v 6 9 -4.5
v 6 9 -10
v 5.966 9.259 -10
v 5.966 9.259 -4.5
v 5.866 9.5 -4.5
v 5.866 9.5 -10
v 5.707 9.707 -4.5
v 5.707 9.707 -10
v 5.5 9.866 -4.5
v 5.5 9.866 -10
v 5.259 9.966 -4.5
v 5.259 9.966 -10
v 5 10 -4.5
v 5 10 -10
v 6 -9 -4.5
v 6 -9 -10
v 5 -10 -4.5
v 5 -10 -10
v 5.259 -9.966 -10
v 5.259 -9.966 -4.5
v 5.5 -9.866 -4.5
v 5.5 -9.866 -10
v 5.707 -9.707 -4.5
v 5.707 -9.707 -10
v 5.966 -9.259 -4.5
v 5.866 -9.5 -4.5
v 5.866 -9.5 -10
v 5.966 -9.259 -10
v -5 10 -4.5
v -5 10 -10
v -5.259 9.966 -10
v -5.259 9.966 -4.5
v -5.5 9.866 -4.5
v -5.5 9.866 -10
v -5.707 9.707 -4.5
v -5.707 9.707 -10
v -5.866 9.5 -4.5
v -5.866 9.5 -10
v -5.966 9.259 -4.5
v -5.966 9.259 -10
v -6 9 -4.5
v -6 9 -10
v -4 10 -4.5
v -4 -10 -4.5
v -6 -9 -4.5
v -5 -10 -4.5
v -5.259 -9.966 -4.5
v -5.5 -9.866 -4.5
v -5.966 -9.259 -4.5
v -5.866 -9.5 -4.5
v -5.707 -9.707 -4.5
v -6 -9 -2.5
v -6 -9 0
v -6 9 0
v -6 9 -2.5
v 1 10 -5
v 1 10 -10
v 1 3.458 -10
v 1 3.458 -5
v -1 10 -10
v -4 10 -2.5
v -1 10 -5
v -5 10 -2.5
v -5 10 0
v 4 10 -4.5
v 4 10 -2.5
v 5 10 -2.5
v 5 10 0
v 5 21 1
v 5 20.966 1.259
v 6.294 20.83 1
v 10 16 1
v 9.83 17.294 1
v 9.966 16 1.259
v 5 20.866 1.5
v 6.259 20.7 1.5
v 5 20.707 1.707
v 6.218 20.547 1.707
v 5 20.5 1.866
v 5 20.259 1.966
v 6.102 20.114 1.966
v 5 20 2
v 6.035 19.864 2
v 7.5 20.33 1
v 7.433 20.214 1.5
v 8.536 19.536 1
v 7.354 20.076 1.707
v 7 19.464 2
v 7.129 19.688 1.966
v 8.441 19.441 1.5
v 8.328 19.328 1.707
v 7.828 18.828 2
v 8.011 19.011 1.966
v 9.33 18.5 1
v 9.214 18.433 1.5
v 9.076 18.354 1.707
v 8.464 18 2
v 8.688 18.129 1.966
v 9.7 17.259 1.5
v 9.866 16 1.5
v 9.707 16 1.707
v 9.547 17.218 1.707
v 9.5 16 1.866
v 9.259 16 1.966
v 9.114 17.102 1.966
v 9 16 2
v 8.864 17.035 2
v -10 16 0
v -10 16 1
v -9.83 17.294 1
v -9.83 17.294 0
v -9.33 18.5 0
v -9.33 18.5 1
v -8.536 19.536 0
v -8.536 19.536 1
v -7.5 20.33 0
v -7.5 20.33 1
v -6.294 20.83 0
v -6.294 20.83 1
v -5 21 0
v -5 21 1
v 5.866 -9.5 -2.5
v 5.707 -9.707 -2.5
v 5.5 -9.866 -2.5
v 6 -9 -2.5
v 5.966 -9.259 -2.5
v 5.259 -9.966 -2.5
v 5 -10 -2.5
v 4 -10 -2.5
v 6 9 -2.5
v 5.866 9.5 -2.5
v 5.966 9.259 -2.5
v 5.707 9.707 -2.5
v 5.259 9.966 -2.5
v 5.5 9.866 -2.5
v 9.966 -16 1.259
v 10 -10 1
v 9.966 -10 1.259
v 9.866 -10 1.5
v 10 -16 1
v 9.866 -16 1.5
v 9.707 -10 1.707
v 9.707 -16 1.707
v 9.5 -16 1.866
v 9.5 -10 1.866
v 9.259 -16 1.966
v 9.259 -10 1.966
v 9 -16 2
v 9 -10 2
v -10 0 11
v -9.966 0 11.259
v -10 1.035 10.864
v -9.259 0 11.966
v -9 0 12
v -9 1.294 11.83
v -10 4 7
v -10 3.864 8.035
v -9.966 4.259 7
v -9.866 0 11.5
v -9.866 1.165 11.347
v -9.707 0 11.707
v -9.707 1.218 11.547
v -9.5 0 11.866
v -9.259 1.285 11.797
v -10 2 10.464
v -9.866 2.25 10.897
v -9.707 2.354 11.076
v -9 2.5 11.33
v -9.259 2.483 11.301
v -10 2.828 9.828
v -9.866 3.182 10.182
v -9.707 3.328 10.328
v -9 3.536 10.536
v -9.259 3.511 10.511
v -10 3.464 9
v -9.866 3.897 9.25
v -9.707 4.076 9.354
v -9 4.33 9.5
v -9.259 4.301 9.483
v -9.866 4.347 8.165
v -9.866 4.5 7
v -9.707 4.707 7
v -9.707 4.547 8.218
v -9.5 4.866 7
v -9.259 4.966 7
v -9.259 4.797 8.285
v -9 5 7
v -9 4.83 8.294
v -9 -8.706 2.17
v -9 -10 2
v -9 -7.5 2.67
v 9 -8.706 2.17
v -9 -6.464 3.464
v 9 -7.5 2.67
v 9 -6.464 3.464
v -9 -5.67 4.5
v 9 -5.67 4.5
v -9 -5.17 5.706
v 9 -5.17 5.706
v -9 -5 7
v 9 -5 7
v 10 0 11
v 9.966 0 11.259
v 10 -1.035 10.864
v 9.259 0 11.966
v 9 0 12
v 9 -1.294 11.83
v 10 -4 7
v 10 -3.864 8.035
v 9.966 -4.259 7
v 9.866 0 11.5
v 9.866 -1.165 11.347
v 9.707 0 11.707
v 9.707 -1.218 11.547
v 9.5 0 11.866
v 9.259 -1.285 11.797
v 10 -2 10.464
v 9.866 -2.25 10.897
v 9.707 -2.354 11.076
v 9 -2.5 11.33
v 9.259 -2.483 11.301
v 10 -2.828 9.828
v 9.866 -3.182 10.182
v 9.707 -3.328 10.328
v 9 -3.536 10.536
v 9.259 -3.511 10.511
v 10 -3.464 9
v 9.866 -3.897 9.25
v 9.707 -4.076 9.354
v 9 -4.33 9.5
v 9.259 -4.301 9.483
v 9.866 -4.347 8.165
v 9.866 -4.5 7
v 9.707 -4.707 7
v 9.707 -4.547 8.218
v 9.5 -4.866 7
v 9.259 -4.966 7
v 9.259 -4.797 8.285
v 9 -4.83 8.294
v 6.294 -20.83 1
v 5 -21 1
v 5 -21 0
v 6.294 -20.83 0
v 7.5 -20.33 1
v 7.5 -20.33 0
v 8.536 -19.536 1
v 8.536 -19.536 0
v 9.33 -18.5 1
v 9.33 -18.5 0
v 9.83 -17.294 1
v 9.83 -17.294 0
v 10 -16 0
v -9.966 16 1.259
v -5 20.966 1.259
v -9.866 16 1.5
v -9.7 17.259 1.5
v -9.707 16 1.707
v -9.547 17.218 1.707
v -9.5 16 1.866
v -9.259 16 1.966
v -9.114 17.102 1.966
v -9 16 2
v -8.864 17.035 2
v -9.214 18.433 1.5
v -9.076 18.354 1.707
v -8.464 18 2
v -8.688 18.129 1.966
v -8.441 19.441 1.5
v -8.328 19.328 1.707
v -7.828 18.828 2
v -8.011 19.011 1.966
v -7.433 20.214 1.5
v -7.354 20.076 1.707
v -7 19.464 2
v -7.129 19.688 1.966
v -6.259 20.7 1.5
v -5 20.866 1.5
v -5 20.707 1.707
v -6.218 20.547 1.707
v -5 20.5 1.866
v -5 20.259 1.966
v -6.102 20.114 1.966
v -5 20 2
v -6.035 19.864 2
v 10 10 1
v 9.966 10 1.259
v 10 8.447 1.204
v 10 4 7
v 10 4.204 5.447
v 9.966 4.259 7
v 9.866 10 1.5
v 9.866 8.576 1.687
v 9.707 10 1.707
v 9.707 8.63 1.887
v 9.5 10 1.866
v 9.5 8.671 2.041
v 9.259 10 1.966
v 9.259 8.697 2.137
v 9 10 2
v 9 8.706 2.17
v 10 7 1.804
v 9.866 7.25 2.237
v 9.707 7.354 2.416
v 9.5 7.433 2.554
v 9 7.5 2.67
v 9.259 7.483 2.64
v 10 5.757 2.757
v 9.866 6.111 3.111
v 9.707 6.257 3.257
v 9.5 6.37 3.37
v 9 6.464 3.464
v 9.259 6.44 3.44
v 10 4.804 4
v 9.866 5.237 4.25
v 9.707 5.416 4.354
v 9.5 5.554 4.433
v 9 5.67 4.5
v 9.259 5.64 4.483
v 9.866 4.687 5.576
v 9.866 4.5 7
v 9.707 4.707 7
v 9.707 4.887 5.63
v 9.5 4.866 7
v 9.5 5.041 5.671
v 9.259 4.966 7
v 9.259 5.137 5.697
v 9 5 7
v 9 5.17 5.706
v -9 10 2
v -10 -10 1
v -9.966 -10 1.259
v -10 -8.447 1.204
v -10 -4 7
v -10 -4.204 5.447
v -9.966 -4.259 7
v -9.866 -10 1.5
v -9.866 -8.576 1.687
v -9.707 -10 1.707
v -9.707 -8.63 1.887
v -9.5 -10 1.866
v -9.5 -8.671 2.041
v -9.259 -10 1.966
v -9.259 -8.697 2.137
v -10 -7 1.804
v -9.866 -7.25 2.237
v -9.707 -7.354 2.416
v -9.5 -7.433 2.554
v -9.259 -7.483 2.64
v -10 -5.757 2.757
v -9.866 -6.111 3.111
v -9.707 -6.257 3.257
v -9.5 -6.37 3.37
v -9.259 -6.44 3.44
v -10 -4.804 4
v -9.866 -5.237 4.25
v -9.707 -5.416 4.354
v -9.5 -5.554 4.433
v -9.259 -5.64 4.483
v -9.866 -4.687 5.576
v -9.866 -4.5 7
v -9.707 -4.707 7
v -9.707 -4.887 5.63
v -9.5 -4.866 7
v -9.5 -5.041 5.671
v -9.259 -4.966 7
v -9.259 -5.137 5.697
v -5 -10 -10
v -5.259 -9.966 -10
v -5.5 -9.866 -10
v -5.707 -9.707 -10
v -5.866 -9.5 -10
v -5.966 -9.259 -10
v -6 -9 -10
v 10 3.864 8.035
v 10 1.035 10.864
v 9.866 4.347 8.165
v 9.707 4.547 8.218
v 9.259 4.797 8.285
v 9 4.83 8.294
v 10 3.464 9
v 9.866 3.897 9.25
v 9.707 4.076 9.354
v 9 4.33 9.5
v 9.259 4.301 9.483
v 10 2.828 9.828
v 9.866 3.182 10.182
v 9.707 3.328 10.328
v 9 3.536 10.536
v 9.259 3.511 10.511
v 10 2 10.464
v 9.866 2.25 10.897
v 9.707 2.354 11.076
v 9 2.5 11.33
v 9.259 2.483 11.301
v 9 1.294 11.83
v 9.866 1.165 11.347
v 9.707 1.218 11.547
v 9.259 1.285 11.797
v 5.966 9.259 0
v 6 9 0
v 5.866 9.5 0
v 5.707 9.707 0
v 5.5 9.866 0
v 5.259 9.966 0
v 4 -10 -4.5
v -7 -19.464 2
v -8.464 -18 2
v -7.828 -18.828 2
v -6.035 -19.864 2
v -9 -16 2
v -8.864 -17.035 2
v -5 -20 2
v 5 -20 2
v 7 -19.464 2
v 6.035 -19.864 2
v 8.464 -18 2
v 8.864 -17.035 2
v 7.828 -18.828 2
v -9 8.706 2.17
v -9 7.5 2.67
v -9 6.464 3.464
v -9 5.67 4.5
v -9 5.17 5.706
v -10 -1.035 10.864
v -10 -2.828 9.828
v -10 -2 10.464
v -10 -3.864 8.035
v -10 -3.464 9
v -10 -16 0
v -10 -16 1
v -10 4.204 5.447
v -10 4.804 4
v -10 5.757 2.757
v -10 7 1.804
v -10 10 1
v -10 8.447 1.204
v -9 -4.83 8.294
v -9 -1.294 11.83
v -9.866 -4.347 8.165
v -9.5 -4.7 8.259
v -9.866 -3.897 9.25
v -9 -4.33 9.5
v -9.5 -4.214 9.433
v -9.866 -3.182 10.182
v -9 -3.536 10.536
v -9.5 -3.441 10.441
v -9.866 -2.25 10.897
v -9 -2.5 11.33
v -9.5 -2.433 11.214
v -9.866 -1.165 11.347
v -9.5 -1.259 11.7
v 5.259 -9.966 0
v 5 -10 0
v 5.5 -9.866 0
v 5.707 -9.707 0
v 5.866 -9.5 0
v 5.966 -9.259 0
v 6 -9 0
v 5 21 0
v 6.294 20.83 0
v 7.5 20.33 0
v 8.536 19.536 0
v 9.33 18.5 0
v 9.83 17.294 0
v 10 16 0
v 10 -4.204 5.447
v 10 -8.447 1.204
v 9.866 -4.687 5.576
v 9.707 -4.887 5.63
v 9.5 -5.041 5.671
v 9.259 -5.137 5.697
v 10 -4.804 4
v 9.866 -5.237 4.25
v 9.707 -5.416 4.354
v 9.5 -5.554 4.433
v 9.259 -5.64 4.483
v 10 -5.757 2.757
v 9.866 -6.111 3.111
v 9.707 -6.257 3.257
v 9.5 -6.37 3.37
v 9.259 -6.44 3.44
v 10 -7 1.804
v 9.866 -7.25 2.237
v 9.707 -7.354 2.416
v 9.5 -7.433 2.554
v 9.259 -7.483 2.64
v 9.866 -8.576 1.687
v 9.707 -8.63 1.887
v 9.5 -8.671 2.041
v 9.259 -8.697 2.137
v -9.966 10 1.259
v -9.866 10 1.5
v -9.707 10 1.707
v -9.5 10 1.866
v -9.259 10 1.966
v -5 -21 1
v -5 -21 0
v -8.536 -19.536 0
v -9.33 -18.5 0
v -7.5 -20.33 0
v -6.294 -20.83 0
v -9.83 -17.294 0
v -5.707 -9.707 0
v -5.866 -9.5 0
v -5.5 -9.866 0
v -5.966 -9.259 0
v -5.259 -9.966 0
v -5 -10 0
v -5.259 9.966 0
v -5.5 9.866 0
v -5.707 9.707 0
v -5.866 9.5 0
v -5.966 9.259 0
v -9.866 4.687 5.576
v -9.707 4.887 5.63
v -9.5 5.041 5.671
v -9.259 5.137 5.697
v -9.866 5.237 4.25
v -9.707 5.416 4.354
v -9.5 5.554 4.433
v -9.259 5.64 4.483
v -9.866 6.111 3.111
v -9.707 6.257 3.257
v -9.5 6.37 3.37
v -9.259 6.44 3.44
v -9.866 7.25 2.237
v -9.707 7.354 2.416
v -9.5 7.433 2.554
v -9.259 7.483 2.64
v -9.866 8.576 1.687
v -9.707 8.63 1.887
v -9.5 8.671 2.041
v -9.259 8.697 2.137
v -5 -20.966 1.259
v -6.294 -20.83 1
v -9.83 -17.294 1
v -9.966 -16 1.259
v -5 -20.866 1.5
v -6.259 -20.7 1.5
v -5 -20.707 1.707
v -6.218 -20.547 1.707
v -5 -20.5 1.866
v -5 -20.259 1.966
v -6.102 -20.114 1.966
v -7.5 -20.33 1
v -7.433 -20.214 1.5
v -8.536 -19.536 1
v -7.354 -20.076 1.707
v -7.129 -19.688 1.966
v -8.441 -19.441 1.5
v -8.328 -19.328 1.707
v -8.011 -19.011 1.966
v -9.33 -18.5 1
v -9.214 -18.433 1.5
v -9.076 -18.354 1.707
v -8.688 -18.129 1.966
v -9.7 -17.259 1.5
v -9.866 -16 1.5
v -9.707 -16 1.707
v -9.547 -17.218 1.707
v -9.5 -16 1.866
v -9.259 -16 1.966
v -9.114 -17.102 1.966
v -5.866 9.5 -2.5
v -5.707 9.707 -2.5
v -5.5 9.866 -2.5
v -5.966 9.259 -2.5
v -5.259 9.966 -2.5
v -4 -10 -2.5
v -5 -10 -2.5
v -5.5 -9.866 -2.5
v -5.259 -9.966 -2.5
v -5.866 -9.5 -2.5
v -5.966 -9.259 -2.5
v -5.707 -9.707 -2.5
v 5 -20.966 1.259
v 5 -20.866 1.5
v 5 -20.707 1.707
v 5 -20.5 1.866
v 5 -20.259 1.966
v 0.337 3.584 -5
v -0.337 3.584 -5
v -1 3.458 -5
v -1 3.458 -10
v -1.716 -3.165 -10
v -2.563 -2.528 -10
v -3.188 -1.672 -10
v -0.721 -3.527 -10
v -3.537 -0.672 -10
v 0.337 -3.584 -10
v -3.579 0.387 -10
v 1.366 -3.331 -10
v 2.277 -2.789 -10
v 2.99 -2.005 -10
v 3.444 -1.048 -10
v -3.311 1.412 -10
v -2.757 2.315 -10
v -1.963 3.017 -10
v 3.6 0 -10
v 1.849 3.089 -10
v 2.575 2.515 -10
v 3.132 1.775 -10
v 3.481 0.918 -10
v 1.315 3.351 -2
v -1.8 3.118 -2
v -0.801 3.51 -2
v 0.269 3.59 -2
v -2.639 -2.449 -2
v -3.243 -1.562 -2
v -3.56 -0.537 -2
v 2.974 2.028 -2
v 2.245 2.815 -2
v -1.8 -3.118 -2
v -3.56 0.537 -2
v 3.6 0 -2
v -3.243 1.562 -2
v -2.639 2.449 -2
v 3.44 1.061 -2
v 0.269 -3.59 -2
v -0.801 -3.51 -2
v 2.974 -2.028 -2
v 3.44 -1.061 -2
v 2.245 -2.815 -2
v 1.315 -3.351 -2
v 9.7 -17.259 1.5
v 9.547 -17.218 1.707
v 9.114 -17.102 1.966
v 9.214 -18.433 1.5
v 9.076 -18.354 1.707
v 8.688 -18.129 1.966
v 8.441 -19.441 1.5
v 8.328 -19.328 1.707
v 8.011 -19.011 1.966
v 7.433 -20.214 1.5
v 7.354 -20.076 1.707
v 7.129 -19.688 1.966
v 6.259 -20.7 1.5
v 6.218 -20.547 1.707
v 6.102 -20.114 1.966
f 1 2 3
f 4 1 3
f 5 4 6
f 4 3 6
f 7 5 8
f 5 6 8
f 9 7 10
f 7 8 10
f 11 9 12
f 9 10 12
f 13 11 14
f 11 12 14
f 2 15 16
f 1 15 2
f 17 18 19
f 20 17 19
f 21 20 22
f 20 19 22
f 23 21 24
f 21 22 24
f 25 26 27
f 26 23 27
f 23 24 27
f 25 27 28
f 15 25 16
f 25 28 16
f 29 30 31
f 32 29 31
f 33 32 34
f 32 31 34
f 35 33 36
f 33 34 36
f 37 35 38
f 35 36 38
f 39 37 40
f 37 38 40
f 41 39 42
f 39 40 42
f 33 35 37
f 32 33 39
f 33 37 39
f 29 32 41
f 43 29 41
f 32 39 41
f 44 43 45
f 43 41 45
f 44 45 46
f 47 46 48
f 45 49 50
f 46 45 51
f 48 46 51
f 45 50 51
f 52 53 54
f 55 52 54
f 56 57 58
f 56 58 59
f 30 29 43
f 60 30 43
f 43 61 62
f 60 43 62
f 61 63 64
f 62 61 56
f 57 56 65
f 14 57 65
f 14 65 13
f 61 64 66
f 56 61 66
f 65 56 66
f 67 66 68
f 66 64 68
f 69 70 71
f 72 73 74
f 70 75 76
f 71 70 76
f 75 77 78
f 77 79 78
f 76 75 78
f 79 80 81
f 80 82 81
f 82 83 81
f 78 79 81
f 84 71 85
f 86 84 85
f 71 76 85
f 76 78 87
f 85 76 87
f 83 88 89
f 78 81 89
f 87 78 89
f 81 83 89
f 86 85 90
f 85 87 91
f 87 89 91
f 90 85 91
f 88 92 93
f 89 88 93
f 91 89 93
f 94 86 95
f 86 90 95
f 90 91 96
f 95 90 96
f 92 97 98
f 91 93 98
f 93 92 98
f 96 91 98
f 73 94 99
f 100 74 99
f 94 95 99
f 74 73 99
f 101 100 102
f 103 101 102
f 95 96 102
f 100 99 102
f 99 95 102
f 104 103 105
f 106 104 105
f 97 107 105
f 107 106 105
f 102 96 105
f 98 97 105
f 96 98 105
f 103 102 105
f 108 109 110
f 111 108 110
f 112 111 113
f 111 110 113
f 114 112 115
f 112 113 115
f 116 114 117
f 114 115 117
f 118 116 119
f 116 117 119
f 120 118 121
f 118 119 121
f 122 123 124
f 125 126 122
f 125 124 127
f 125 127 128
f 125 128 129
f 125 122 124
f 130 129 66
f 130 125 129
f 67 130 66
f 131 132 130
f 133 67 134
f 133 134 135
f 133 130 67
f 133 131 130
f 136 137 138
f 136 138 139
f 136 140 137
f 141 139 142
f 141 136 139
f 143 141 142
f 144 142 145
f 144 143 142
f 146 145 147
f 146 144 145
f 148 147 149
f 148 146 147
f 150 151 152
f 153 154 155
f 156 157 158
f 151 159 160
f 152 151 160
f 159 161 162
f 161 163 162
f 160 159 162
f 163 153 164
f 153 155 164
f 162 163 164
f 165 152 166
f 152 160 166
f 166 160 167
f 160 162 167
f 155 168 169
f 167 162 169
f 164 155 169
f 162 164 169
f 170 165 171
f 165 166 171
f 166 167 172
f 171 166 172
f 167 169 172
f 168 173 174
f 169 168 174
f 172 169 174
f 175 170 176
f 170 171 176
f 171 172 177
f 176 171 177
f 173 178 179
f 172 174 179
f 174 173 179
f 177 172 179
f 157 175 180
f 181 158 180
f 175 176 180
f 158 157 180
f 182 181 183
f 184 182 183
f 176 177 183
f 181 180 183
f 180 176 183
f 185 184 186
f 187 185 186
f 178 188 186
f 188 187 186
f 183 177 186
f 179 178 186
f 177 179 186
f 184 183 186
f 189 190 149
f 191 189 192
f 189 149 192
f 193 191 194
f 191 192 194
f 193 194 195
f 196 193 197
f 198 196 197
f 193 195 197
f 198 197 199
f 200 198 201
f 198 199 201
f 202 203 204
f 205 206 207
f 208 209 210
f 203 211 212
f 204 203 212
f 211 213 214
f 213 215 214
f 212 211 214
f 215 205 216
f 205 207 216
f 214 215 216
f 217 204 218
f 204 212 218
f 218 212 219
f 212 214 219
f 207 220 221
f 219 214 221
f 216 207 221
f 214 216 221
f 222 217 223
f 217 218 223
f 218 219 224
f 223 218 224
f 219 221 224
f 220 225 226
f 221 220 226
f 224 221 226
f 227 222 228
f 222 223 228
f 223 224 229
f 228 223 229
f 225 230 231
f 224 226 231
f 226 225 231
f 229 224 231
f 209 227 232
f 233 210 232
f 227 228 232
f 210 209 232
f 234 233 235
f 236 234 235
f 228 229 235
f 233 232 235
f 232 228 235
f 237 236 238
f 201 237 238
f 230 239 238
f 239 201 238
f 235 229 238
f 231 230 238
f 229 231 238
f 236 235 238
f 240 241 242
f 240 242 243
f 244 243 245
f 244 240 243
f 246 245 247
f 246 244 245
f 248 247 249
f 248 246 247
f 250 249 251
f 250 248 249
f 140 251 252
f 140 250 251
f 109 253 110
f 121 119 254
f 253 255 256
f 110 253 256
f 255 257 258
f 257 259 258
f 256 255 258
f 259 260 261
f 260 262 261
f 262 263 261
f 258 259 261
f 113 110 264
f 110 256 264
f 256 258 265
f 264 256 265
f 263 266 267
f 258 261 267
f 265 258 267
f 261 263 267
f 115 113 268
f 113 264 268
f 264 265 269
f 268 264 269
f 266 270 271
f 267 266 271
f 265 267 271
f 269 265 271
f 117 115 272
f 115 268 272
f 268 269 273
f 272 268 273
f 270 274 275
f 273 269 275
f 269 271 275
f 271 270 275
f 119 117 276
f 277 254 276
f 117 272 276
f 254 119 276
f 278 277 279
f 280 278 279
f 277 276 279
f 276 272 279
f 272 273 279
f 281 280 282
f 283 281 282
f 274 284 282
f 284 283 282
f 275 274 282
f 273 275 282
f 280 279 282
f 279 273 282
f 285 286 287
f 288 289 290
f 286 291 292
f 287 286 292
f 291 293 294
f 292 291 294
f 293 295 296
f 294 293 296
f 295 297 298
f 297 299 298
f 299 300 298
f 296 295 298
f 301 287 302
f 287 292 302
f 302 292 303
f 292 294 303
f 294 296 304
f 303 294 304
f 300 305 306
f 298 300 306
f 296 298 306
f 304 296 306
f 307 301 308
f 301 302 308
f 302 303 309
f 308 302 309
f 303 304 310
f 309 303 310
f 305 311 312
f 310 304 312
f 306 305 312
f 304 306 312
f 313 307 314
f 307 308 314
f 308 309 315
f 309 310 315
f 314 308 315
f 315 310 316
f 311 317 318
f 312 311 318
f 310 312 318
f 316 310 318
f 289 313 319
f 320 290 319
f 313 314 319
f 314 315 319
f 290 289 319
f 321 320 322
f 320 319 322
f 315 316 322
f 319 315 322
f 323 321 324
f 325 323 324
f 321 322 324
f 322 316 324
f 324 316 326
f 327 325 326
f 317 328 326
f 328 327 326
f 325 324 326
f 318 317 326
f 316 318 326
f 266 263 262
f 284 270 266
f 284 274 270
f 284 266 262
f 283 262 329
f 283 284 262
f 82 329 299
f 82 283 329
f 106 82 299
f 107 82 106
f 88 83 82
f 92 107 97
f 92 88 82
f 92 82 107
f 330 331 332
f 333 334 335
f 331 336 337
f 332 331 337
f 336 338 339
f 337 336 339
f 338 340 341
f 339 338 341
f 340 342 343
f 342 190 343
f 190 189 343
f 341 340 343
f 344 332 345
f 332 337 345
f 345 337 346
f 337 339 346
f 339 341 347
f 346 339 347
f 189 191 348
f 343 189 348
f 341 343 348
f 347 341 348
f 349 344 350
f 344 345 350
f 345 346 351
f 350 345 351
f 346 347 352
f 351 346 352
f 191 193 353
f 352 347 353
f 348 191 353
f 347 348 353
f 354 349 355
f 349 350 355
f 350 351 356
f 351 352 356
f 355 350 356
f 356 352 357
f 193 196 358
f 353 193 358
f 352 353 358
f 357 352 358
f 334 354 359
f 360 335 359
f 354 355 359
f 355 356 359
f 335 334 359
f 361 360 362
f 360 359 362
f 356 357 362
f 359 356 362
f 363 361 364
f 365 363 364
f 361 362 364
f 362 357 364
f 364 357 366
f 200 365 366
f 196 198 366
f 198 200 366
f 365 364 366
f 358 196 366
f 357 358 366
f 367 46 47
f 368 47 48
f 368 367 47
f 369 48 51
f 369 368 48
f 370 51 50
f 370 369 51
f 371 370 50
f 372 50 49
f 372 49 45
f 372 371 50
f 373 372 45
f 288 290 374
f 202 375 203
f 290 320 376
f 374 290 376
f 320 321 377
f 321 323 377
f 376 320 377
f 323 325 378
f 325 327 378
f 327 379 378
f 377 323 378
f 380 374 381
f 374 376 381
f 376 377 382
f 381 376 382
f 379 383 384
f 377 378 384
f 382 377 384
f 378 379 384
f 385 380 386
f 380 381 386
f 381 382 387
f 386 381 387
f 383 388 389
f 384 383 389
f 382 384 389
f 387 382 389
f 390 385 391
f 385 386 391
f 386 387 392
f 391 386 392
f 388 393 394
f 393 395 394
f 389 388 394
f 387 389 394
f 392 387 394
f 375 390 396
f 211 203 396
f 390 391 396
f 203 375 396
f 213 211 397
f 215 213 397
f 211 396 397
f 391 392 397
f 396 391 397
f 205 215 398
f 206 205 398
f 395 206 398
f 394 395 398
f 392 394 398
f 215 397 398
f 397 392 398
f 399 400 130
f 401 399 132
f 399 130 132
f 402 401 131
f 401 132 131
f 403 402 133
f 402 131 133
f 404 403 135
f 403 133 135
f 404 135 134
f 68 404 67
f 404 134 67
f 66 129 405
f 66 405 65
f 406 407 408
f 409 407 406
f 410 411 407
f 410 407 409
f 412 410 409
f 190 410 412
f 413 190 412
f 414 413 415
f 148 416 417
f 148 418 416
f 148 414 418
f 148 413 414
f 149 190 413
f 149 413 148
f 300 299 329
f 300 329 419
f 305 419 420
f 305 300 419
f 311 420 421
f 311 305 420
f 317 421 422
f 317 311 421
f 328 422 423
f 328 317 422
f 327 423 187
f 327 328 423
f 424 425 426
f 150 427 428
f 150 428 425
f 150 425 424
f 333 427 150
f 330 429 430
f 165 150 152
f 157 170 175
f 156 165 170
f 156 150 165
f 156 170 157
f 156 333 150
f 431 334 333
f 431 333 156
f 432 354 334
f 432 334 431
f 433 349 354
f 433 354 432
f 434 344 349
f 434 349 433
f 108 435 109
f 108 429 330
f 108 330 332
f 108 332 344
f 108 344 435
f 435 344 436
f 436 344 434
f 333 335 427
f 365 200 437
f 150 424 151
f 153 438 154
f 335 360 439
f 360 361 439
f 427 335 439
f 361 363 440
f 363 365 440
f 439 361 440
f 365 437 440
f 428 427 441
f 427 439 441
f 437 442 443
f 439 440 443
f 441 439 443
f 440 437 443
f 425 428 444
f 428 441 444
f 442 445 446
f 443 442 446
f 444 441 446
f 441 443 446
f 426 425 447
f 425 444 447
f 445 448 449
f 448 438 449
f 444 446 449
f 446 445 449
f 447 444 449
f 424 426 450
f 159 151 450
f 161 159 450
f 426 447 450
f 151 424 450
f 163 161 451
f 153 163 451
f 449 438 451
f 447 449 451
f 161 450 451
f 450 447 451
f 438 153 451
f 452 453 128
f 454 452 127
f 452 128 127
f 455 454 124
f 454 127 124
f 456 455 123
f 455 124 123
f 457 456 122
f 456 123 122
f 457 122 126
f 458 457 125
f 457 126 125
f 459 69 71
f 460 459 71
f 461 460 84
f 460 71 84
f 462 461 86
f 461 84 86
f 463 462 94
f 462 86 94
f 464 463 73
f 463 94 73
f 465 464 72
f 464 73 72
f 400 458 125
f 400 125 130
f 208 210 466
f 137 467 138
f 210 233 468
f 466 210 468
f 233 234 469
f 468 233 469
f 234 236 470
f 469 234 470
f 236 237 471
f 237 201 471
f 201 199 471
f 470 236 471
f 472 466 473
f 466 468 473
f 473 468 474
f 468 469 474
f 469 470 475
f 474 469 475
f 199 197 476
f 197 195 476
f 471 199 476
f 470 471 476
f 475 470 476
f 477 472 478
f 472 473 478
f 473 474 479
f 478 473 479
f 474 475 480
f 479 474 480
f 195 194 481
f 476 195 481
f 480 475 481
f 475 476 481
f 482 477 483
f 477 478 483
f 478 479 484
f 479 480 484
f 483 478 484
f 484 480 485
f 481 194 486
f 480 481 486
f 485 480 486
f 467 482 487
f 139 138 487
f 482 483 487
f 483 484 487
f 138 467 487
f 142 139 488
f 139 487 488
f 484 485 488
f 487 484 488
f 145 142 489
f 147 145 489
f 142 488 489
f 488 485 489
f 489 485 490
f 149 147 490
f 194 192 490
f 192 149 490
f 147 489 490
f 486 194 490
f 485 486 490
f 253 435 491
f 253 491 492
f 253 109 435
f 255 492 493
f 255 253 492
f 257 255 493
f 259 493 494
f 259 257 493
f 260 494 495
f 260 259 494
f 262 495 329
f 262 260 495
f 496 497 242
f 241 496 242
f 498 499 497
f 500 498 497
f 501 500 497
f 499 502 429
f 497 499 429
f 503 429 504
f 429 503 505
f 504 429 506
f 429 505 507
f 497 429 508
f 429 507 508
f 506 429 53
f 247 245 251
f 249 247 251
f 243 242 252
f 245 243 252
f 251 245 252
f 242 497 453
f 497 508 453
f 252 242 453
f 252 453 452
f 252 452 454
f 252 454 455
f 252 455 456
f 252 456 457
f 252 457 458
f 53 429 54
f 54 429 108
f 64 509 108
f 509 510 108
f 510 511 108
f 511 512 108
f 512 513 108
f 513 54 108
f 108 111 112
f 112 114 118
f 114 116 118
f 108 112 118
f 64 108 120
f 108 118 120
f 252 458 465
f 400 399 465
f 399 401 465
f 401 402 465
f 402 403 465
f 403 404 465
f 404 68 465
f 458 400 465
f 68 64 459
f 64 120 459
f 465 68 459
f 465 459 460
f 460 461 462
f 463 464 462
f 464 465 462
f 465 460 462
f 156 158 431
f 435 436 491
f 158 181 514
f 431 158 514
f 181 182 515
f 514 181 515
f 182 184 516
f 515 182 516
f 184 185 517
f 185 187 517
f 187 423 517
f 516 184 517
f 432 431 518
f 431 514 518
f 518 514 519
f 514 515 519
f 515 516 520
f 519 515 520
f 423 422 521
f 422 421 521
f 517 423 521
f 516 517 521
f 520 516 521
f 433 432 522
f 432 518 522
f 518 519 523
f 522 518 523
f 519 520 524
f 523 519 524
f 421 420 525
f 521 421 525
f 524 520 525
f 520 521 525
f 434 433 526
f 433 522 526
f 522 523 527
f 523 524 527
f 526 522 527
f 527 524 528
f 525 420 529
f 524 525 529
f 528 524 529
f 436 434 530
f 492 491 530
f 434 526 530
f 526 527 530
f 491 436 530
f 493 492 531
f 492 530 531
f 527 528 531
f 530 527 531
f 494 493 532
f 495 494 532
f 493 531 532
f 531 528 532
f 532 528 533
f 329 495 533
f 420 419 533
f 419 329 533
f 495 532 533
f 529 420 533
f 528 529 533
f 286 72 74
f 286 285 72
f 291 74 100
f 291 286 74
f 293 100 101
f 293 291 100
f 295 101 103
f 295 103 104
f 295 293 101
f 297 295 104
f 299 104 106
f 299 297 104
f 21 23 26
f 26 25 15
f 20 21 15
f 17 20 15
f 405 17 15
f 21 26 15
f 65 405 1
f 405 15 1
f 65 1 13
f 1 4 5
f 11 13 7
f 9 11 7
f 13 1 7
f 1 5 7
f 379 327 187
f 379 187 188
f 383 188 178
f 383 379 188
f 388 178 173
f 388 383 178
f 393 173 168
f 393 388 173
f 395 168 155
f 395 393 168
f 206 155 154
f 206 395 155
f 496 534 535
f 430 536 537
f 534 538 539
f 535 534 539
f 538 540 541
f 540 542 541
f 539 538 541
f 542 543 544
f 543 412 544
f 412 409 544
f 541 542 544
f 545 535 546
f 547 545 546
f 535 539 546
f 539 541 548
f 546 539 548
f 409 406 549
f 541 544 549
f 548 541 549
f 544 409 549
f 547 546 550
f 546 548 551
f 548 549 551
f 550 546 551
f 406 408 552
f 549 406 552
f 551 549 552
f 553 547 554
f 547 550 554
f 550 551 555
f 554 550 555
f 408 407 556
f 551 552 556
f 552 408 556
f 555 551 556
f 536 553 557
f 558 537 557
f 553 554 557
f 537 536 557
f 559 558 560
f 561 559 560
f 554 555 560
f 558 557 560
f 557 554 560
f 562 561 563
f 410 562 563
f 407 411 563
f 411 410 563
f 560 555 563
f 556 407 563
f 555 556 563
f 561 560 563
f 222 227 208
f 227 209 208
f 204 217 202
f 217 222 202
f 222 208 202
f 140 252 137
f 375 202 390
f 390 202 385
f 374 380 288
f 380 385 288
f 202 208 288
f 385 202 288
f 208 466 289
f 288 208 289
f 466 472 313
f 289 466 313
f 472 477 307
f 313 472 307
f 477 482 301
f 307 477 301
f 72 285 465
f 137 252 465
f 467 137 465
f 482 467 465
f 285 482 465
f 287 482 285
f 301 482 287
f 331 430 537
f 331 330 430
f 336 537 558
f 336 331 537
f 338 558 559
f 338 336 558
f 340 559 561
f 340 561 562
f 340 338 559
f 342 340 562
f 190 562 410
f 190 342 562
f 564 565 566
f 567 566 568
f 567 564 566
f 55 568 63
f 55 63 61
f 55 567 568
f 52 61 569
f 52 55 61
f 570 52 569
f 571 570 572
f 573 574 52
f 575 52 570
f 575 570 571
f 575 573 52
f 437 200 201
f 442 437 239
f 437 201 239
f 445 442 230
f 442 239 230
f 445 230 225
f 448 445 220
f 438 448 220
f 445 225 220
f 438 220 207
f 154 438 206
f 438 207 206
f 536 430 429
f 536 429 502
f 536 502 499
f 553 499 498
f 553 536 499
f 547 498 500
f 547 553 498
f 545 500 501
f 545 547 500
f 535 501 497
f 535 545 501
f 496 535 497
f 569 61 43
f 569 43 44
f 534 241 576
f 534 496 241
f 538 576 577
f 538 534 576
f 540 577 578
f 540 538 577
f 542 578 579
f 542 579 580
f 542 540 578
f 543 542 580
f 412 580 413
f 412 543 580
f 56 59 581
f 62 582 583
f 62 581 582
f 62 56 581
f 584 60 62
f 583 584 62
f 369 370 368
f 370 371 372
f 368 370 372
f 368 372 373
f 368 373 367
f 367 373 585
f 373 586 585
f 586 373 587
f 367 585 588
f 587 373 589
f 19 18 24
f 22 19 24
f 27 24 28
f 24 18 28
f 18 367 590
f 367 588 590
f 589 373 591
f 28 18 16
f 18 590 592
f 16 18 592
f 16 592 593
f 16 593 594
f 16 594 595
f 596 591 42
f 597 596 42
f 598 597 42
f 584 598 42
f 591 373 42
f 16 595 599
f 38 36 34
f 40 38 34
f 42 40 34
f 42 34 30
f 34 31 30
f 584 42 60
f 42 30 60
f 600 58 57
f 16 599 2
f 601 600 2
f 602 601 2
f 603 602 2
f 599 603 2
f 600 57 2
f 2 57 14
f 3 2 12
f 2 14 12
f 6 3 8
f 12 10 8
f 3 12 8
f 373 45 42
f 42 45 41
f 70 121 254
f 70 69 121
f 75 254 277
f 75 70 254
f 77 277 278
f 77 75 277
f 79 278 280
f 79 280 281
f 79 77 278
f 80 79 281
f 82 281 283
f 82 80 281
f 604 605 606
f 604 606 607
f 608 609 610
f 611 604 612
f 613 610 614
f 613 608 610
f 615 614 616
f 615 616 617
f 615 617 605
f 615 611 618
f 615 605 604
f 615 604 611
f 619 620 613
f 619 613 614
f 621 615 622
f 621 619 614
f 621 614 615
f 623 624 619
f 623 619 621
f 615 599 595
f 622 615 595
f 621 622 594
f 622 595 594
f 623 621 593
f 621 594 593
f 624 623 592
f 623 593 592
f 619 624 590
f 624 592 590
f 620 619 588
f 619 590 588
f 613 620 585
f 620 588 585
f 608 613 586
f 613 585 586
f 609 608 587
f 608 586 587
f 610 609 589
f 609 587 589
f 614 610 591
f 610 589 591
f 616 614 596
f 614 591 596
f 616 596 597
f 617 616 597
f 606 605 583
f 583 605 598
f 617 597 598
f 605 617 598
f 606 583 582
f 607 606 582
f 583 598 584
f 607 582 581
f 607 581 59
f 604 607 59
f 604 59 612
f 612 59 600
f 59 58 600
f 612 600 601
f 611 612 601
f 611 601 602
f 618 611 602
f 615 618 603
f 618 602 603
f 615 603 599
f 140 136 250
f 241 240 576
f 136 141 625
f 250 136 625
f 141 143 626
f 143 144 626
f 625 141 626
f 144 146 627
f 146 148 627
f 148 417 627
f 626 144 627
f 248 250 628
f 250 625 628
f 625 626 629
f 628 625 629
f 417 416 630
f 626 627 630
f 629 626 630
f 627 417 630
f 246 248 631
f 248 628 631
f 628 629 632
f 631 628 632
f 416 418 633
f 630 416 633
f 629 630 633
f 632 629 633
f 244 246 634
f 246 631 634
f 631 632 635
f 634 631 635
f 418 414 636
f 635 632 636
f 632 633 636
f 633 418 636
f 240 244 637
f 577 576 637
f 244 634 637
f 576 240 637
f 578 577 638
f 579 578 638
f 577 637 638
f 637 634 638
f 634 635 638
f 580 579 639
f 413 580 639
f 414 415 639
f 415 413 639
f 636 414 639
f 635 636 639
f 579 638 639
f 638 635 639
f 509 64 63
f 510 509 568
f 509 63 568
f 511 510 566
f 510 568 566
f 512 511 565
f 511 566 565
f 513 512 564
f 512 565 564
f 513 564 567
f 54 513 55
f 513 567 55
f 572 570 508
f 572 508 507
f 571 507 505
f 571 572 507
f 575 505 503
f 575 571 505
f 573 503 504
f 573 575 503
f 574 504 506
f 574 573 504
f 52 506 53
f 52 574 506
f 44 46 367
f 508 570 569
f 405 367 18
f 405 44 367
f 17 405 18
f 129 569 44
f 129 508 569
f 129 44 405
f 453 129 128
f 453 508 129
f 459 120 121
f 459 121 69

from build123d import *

# Parameters (mm, degrees)
F0_W      = 20
F0_H      = 42
F1_DEPTH  = 2
F2_W      = 12
F2_H      = 20
F3_DEPTH  = 10
F4_R      = 1
F5_W      = 20
F5_H      = 10
F6_DEPTH  = 10
F7_R      = 4.99999
F8_R      = 3.6
F9_DEPTH  = 8
F10_W     = 2
F10_H     = 5
F11_DEPTH = 7
F12_R     = 5
F13_W     = 25
F13_H     = 2
F14_DEPTH = 2
F15_W     = 28.3062260176
F15_H     = 2
F16_DEPTH = 2
F17_R     = 1


# Not quite as in the source:
# - a fillet or chamfer is up to 0.001 mm smaller than in the source, because OpenCascade refuses the exact size


with BuildPart() as f1:
    # F0 (on Top) → F1 (new body)
    with BuildSketch(Plane.XY):
        Rectangle(F0_W, F0_H)
    extrude(amount=F1_DEPTH)

    # F2 (on Top) → F3 (join)
    with BuildSketch(Plane.XY):
        Rectangle(F2_W, F2_H)
    extrude(amount=-F3_DEPTH)

    # F4
    f4_edges = [f1.edges().sort_by_distance(p)[0] for p in [
        (-6, -10, -5),
        (6, -10, -5),
        (-6, 10, -5),
        (6, 10, -5),
    ]]
    fillet(f4_edges, radius=F4_R)

    # F5 (on face) → F6 (join)
    with BuildSketch(Plane.XY.offset(2)):
        Rectangle(F5_W, F5_H)
    extrude(amount=F6_DEPTH)

    # F7 (radius 5 in the source; OpenCascade refuses exactly that, so slightly less here)
    f7_edges = [f1.edges().sort_by_distance(p)[0] for p in [
        (0, -5, 12),
        (0, 5, 12),
        (0, -5, 2),
        (0, 5, 2),
    ]]
    fillet(f7_edges, radius=F7_R)

    # F8 (on face) → F9 (cut)
    with BuildSketch(Plane(origin=(0, 0, -10), x_dir=(1, 0, 0), z_dir=(0, 0, -1))):
        Circle(F8_R)
    extrude(amount=-F9_DEPTH, mode=Mode.SUBTRACT)

    # F10 (on face) → F11 (cut)
    with BuildSketch(Plane(origin=(0, 10, 0), x_dir=(-1, 0, 0), z_dir=(0, 1, 0))):
        with Locations((0, -7.5)):
            Rectangle(F10_W, F10_H)
    extrude(amount=-F11_DEPTH, mode=Mode.SUBTRACT)

    # F12
    f12_edges = [f1.edges().sort_by_distance(p)[0] for p in [
        (10, -21, 1),
        (-10, 21, 1),
        (10, 21, 1),
        (-10, -21, 1),
    ]]
    fillet(f12_edges, radius=F12_R)

    # F13 (on face) → F14 (cut)
    with BuildSketch(Plane(origin=(-6, 0, 0), x_dir=(0, -1, 0), z_dir=(-1, 0, 0))):
        with Locations((-0.9450479232, -3.5)):
            Rectangle(F13_W, F13_H)
    extrude(amount=-F14_DEPTH, mode=Mode.SUBTRACT)

    # F15 (on face) → F16 (cut)
    with BuildSketch(Plane.YZ.offset(6)):
        with Locations((-0.2904124558, -3.5)):
            Rectangle(F15_W, F15_H)
    extrude(amount=-F16_DEPTH, mode=Mode.SUBTRACT)

    # F17
    f17_edges = [f1.edges().sort_by_distance(p)[0] for p in [
        (-10, -3.535537, 10.535537),
    ]]
    fillet(f17_edges, radius=F17_R)


solid = f1.part
